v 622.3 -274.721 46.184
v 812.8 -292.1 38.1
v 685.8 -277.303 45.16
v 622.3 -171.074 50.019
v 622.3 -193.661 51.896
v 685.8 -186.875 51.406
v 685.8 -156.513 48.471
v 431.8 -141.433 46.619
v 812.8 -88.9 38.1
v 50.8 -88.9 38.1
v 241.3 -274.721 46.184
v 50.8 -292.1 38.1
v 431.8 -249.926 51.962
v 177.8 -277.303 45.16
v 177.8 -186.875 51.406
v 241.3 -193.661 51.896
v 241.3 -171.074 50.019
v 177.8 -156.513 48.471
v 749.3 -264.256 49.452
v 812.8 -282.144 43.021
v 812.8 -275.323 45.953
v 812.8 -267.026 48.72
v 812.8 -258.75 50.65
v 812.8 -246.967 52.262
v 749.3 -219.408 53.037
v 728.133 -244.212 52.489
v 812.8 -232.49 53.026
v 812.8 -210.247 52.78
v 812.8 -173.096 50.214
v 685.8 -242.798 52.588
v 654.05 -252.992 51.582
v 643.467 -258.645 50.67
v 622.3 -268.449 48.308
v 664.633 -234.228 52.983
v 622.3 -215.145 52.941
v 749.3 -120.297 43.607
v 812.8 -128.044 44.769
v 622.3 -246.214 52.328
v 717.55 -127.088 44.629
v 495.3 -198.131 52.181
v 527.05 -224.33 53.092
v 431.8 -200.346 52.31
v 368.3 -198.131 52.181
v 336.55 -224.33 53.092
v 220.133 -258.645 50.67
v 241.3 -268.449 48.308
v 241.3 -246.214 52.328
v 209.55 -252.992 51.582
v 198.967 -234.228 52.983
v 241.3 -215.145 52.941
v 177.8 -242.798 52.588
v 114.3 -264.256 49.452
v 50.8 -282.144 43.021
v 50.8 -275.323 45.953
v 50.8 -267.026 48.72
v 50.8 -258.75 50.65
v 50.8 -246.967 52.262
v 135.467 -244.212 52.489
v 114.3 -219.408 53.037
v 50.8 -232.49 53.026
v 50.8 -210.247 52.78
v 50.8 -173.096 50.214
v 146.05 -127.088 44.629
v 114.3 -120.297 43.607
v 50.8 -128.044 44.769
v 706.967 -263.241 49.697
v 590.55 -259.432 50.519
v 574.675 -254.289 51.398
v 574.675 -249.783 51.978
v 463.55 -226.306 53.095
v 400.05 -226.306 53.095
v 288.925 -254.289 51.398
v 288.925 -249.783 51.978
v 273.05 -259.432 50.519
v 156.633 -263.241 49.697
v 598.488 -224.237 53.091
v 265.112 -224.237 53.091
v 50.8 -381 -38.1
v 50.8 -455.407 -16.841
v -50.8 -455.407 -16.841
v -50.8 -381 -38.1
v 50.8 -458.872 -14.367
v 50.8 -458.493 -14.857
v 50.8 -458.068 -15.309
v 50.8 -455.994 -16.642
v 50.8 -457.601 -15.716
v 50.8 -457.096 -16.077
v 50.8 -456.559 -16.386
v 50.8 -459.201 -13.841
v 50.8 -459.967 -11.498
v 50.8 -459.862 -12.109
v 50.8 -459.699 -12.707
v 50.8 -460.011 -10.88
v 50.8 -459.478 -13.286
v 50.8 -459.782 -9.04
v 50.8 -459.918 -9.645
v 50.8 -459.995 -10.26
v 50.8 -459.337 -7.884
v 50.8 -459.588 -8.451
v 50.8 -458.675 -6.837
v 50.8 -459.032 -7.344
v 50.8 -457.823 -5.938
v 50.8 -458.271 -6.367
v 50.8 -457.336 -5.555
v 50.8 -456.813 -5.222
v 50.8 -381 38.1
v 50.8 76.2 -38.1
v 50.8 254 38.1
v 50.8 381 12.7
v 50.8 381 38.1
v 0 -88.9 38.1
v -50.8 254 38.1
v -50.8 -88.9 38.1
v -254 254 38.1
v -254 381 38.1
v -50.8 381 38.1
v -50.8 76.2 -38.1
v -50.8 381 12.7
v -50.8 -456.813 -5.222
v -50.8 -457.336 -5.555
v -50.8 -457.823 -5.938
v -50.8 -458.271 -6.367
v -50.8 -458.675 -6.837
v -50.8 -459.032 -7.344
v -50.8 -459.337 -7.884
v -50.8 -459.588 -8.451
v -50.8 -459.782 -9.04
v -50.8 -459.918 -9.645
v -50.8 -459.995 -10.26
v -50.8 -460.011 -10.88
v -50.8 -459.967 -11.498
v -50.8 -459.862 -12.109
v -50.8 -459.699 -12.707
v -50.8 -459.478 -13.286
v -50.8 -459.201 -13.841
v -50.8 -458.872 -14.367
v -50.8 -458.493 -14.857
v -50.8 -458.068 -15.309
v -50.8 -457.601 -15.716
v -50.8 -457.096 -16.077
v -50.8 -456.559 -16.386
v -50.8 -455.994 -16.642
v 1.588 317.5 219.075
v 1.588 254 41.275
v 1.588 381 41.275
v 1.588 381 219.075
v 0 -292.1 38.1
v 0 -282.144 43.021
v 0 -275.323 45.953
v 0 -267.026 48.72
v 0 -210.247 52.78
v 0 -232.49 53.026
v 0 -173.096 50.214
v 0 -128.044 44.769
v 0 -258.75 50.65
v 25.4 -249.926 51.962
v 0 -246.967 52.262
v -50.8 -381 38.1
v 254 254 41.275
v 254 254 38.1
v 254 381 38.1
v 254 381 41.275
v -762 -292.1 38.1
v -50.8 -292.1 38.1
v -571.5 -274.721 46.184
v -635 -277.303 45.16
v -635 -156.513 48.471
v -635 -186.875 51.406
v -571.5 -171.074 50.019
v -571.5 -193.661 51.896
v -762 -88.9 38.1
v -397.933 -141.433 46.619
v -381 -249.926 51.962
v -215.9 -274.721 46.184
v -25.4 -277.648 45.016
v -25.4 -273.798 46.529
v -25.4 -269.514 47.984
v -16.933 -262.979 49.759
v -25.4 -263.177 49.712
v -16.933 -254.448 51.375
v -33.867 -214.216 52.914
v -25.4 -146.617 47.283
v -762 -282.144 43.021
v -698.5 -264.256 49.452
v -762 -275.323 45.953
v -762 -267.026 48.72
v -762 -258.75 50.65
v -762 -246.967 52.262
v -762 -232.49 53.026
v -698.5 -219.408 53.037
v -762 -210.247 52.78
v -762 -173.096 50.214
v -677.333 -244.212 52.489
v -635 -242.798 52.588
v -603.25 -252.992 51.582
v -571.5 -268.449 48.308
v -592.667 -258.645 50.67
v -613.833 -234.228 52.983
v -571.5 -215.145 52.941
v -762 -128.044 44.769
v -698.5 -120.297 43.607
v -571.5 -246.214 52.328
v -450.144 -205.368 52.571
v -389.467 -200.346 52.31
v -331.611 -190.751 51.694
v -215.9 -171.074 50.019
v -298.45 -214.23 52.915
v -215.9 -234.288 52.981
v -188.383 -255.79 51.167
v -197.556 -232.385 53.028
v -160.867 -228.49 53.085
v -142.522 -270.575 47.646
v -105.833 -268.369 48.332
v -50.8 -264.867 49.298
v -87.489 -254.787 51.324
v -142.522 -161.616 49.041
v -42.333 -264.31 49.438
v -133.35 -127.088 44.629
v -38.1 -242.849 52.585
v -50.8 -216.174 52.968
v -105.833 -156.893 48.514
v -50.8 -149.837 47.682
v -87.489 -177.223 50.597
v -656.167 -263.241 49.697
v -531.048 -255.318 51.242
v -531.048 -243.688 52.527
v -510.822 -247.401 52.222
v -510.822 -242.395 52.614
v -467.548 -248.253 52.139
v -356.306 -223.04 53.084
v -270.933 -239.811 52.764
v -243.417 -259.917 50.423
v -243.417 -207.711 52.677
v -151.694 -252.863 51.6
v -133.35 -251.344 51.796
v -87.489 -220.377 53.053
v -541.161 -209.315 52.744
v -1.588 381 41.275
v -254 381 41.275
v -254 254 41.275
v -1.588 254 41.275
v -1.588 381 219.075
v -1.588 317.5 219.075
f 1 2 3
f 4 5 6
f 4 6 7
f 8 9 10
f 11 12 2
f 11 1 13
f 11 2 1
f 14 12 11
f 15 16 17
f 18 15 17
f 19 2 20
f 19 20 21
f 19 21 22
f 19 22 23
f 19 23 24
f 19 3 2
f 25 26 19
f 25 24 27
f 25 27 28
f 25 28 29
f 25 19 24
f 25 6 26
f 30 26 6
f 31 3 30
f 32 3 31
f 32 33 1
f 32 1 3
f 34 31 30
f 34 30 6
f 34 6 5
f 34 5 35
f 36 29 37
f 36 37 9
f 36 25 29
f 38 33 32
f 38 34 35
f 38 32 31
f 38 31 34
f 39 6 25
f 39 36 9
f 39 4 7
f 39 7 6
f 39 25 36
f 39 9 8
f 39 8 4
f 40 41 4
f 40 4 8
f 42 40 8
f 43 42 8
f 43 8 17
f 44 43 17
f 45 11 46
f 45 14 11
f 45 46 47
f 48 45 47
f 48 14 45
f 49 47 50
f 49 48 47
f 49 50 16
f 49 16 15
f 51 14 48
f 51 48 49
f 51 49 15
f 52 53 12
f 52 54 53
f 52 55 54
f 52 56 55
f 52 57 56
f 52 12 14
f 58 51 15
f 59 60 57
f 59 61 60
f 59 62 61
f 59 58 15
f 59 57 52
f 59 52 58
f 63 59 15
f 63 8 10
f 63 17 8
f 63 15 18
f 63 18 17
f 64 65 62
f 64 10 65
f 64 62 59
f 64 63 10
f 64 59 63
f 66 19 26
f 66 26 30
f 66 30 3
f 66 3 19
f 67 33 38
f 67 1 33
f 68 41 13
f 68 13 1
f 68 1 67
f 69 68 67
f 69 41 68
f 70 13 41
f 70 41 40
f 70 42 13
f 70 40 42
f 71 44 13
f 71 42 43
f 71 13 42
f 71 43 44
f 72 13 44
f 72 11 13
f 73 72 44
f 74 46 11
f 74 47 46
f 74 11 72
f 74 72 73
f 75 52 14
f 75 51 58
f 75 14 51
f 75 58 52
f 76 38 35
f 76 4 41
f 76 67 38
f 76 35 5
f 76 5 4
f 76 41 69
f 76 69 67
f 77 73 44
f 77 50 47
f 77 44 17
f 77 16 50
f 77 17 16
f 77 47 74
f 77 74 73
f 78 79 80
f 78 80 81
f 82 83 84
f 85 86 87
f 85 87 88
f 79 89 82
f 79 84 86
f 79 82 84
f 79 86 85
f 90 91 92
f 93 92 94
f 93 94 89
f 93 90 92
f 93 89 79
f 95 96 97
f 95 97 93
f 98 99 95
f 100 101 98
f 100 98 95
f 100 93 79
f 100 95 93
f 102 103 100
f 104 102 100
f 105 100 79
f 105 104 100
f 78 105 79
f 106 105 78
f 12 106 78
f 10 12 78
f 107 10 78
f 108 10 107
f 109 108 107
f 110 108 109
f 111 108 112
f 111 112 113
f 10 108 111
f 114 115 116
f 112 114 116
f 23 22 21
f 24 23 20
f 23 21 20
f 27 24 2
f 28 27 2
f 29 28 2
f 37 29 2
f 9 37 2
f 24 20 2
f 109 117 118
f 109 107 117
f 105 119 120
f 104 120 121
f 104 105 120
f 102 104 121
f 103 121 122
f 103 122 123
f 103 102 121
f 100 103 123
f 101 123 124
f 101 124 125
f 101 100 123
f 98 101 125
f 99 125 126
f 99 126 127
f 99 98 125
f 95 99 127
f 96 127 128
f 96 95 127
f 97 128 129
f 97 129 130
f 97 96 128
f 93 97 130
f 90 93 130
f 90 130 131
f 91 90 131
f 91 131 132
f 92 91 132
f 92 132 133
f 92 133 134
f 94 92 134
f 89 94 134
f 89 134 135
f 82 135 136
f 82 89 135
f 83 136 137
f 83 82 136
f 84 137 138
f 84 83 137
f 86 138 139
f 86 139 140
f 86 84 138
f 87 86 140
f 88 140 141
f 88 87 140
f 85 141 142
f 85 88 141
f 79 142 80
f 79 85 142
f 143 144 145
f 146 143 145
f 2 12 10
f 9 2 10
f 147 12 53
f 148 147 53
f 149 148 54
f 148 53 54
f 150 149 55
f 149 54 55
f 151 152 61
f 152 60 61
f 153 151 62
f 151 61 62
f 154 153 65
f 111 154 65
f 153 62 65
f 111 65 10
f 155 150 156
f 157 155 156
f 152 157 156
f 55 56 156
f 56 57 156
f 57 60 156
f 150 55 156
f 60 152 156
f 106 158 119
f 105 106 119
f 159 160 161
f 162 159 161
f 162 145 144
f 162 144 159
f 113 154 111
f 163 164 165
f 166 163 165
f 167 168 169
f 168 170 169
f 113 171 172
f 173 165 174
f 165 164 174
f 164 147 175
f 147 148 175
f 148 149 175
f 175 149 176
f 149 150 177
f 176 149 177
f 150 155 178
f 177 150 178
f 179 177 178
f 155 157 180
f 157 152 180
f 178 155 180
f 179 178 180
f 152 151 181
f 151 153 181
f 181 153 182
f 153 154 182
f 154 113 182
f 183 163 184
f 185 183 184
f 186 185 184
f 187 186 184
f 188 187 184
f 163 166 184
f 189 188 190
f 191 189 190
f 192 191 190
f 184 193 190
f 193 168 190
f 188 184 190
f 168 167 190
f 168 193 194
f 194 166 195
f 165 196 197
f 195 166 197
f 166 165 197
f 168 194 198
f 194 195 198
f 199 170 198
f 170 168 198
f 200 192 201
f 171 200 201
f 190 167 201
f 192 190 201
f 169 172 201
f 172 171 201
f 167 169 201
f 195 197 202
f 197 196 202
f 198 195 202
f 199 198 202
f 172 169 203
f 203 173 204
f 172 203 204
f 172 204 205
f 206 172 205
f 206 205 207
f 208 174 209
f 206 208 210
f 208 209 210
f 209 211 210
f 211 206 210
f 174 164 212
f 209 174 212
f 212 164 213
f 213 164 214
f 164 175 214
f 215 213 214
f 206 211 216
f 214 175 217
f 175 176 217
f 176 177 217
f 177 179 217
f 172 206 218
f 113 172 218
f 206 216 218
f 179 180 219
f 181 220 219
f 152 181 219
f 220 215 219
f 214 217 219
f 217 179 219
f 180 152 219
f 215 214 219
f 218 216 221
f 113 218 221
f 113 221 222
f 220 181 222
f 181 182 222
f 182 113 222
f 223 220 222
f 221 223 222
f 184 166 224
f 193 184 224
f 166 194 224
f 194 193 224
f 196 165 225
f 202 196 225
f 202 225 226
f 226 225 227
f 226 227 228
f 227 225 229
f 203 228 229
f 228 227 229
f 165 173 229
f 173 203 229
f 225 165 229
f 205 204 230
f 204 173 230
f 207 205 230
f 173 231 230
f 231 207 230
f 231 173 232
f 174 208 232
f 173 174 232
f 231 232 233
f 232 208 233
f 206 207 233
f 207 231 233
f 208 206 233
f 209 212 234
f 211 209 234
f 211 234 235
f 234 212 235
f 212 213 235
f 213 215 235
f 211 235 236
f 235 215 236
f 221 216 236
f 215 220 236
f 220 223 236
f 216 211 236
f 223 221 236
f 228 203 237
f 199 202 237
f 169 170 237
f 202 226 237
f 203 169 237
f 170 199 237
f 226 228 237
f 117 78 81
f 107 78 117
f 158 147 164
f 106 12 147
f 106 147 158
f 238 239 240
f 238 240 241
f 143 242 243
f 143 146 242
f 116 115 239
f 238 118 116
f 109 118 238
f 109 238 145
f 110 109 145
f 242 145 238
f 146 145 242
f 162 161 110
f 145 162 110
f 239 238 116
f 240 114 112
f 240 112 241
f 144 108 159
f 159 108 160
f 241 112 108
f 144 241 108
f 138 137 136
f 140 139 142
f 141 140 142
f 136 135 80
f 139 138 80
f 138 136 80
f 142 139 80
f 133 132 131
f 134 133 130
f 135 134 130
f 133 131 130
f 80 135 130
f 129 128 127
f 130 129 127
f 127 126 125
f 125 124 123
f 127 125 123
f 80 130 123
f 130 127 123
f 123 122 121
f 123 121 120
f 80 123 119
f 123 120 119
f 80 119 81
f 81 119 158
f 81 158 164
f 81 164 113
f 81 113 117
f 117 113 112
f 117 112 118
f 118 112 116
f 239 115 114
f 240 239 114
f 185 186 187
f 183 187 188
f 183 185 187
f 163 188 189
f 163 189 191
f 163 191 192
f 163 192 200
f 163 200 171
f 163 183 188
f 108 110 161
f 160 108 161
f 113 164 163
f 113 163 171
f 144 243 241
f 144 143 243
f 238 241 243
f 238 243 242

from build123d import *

# Parameters (mm, degrees)
F1_DEPTH      = 50.8
F1_DEPTH_BACK = 50.8
F3_DEPTH      = 762
F3_DEPTH_BACK = 50.8
F4_DEPTH      = 762
F6_DEPTH      = 3.175
F8_DEPTH      = 1.5875
F8_DEPTH_BACK = 1.5875


with BuildPart() as f1:
    # F0 (on Right) → F1 (new body, two sides)
    with BuildSketch(Plane.YZ) as f1_sk:
        Polygon((381, 38.1), (-381, 38.1), (-381, -38.1), (76.2, -38.1), (381, 12.7), align=None)
        with BuildLine():
            Line((-381, -38.1), (-381, 38.1))
            Line((-381, 38.1), (-456.8131431755, -5.2217961003))
            ThreePointArc((-456.8131431755, -5.2217961003), (-459.966673464, -11.4979806695), (-455.407140079, -16.8408171203))
            Line((-455.407140079, -16.8408171203), (-381, -38.1))
        make_face()
    extrude(amount=F1_DEPTH)
    extrude(f1_sk.sketch, amount=-F1_DEPTH_BACK)

    # F2 (on face) → F3 (join, two sides)
    with BuildSketch(Plane.YZ.offset(50.8)) as f3_sk:
        with BuildLine():
            add(Edge.make_bspline(
                [(-292.1, 38.1), (-281.1949449618, 43.4993048445), (-250.7339826465, 61.3466214867), (-133.004817435, 46.9623463878), (-88.9, 38.1)],
                knots=[0, 0, 0, 0, 0.343873239, 1, 1, 1, 1], degree=3))
            Line((-292.1, 38.1), (-88.9, 38.1))
        make_face()
    extrude(amount=F3_DEPTH)
    extrude(f3_sk.sketch, amount=-F3_DEPTH_BACK)

    # F4 (add): a face of the model
    f4_faces = [f1.faces().sort_by_distance(p)[0] for p in [
        (0, -202.4475287343, 44.07819993),
    ]]
    extrude(f4_faces, amount=F4_DEPTH)

    # F5 (on face) → F6 (join)
    with BuildSketch(Plane.XY.offset(38.1)):
        Polygon((-254, 254), (0, 254), (254, 254), (254, 381), (0, 381), (-254, 381), align=None)
    extrude(amount=F6_DEPTH)

    # F7 (on Right) → F8 (join, two sides)
    with BuildSketch(Plane.YZ) as f8_sk:
        Polygon((317.5, 219.075), (254, 41.275), (381, 41.275), (381, 219.075), align=None)
    extrude(amount=F8_DEPTH)
    extrude(f8_sk.sketch, amount=-F8_DEPTH_BACK)


solid = f1.part
